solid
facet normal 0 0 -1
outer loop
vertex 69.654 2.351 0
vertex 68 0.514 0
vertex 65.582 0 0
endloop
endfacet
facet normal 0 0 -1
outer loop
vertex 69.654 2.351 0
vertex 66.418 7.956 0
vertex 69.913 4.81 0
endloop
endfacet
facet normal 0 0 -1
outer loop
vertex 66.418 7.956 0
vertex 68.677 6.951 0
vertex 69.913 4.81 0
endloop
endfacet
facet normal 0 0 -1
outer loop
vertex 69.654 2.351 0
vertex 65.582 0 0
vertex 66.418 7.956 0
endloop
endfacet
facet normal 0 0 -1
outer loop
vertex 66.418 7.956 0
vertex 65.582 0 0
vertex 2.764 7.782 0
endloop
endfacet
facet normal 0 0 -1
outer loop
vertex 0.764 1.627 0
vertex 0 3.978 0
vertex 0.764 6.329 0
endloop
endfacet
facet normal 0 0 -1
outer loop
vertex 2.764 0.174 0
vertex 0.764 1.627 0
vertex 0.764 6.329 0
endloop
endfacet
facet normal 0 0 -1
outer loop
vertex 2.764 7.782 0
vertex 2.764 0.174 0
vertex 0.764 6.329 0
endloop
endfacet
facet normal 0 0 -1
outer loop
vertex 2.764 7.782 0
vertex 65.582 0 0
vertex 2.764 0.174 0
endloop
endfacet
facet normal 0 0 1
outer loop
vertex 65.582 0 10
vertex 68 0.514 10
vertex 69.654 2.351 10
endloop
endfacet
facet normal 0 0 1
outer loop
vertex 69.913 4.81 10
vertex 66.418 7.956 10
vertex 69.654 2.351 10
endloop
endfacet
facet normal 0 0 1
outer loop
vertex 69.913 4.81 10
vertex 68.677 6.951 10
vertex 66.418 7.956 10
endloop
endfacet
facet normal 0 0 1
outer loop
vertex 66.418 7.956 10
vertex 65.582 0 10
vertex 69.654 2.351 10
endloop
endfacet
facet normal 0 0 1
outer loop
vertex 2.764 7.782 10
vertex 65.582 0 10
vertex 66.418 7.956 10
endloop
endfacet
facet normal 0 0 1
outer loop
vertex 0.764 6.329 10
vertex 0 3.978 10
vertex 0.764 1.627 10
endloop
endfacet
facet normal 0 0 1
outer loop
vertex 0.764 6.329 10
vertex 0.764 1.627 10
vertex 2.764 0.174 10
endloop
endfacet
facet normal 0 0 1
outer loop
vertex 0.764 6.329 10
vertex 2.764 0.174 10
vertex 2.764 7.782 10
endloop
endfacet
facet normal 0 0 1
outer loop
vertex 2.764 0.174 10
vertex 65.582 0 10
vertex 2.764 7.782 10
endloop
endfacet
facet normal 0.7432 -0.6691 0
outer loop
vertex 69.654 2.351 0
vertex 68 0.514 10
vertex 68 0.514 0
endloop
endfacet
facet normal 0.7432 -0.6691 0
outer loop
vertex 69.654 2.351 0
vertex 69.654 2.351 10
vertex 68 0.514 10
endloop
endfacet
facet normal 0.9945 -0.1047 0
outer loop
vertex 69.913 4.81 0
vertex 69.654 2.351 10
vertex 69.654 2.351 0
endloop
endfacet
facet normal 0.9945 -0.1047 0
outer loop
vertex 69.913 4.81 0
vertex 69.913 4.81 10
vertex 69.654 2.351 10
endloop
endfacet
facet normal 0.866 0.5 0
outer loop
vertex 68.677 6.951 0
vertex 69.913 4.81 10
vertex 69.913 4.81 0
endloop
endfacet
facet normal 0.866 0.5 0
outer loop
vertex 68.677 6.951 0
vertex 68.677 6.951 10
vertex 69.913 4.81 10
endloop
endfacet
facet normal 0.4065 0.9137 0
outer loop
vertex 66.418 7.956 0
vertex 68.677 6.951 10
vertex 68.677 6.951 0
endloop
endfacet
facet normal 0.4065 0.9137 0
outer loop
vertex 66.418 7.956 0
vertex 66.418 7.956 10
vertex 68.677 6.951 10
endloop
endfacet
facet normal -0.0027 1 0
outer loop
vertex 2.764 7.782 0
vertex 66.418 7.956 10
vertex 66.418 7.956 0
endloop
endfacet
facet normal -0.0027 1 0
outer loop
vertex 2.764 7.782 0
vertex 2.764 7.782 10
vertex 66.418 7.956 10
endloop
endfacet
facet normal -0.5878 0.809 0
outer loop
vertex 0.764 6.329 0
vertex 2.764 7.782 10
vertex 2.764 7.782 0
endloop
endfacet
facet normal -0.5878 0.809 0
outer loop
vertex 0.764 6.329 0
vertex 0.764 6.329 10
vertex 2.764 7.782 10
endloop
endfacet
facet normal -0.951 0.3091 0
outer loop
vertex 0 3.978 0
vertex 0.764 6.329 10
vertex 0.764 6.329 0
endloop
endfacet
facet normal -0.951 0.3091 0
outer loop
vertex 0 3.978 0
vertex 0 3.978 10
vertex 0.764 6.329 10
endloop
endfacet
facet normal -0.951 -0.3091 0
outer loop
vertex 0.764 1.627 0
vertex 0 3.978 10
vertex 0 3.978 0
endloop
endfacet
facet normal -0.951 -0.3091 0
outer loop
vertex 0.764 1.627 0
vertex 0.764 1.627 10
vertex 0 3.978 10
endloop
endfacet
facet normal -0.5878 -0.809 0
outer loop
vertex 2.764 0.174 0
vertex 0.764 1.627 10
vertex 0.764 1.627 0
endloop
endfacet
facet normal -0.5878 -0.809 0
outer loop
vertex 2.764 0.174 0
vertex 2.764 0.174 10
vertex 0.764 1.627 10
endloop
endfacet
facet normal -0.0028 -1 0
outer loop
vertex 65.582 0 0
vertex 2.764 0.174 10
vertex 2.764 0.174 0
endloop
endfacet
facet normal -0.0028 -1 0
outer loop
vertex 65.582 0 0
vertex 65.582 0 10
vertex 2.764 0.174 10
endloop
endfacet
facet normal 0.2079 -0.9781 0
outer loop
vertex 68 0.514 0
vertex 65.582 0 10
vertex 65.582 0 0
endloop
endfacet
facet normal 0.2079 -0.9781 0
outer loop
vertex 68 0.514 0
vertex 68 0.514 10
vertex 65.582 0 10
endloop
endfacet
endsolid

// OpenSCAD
$fn = 32;

// ----------------------------------------------------------------------
// Key bar: parallel key, 10 mm thick
// ----------------------------------------------------------------------

// --- parameters (mm) ---
profile_height = 10;      // extrusion height
profile_points = 11;      // points of the closed outline

profile = [[0, 3.978], [0.764, 1.627], [2.764, 0.174], [65.582, 0], [68, 0.514], [69.654, 2.351], [69.913, 4.81], [68.677, 6.951], [66.418, 7.956], [2.764, 7.782], [0.764, 6.329]];  // single closed polygon, 11 points, counter clockwise

// --- the one profile operation ---
linear_extrude(height = profile_height) polygon(points = profile);
